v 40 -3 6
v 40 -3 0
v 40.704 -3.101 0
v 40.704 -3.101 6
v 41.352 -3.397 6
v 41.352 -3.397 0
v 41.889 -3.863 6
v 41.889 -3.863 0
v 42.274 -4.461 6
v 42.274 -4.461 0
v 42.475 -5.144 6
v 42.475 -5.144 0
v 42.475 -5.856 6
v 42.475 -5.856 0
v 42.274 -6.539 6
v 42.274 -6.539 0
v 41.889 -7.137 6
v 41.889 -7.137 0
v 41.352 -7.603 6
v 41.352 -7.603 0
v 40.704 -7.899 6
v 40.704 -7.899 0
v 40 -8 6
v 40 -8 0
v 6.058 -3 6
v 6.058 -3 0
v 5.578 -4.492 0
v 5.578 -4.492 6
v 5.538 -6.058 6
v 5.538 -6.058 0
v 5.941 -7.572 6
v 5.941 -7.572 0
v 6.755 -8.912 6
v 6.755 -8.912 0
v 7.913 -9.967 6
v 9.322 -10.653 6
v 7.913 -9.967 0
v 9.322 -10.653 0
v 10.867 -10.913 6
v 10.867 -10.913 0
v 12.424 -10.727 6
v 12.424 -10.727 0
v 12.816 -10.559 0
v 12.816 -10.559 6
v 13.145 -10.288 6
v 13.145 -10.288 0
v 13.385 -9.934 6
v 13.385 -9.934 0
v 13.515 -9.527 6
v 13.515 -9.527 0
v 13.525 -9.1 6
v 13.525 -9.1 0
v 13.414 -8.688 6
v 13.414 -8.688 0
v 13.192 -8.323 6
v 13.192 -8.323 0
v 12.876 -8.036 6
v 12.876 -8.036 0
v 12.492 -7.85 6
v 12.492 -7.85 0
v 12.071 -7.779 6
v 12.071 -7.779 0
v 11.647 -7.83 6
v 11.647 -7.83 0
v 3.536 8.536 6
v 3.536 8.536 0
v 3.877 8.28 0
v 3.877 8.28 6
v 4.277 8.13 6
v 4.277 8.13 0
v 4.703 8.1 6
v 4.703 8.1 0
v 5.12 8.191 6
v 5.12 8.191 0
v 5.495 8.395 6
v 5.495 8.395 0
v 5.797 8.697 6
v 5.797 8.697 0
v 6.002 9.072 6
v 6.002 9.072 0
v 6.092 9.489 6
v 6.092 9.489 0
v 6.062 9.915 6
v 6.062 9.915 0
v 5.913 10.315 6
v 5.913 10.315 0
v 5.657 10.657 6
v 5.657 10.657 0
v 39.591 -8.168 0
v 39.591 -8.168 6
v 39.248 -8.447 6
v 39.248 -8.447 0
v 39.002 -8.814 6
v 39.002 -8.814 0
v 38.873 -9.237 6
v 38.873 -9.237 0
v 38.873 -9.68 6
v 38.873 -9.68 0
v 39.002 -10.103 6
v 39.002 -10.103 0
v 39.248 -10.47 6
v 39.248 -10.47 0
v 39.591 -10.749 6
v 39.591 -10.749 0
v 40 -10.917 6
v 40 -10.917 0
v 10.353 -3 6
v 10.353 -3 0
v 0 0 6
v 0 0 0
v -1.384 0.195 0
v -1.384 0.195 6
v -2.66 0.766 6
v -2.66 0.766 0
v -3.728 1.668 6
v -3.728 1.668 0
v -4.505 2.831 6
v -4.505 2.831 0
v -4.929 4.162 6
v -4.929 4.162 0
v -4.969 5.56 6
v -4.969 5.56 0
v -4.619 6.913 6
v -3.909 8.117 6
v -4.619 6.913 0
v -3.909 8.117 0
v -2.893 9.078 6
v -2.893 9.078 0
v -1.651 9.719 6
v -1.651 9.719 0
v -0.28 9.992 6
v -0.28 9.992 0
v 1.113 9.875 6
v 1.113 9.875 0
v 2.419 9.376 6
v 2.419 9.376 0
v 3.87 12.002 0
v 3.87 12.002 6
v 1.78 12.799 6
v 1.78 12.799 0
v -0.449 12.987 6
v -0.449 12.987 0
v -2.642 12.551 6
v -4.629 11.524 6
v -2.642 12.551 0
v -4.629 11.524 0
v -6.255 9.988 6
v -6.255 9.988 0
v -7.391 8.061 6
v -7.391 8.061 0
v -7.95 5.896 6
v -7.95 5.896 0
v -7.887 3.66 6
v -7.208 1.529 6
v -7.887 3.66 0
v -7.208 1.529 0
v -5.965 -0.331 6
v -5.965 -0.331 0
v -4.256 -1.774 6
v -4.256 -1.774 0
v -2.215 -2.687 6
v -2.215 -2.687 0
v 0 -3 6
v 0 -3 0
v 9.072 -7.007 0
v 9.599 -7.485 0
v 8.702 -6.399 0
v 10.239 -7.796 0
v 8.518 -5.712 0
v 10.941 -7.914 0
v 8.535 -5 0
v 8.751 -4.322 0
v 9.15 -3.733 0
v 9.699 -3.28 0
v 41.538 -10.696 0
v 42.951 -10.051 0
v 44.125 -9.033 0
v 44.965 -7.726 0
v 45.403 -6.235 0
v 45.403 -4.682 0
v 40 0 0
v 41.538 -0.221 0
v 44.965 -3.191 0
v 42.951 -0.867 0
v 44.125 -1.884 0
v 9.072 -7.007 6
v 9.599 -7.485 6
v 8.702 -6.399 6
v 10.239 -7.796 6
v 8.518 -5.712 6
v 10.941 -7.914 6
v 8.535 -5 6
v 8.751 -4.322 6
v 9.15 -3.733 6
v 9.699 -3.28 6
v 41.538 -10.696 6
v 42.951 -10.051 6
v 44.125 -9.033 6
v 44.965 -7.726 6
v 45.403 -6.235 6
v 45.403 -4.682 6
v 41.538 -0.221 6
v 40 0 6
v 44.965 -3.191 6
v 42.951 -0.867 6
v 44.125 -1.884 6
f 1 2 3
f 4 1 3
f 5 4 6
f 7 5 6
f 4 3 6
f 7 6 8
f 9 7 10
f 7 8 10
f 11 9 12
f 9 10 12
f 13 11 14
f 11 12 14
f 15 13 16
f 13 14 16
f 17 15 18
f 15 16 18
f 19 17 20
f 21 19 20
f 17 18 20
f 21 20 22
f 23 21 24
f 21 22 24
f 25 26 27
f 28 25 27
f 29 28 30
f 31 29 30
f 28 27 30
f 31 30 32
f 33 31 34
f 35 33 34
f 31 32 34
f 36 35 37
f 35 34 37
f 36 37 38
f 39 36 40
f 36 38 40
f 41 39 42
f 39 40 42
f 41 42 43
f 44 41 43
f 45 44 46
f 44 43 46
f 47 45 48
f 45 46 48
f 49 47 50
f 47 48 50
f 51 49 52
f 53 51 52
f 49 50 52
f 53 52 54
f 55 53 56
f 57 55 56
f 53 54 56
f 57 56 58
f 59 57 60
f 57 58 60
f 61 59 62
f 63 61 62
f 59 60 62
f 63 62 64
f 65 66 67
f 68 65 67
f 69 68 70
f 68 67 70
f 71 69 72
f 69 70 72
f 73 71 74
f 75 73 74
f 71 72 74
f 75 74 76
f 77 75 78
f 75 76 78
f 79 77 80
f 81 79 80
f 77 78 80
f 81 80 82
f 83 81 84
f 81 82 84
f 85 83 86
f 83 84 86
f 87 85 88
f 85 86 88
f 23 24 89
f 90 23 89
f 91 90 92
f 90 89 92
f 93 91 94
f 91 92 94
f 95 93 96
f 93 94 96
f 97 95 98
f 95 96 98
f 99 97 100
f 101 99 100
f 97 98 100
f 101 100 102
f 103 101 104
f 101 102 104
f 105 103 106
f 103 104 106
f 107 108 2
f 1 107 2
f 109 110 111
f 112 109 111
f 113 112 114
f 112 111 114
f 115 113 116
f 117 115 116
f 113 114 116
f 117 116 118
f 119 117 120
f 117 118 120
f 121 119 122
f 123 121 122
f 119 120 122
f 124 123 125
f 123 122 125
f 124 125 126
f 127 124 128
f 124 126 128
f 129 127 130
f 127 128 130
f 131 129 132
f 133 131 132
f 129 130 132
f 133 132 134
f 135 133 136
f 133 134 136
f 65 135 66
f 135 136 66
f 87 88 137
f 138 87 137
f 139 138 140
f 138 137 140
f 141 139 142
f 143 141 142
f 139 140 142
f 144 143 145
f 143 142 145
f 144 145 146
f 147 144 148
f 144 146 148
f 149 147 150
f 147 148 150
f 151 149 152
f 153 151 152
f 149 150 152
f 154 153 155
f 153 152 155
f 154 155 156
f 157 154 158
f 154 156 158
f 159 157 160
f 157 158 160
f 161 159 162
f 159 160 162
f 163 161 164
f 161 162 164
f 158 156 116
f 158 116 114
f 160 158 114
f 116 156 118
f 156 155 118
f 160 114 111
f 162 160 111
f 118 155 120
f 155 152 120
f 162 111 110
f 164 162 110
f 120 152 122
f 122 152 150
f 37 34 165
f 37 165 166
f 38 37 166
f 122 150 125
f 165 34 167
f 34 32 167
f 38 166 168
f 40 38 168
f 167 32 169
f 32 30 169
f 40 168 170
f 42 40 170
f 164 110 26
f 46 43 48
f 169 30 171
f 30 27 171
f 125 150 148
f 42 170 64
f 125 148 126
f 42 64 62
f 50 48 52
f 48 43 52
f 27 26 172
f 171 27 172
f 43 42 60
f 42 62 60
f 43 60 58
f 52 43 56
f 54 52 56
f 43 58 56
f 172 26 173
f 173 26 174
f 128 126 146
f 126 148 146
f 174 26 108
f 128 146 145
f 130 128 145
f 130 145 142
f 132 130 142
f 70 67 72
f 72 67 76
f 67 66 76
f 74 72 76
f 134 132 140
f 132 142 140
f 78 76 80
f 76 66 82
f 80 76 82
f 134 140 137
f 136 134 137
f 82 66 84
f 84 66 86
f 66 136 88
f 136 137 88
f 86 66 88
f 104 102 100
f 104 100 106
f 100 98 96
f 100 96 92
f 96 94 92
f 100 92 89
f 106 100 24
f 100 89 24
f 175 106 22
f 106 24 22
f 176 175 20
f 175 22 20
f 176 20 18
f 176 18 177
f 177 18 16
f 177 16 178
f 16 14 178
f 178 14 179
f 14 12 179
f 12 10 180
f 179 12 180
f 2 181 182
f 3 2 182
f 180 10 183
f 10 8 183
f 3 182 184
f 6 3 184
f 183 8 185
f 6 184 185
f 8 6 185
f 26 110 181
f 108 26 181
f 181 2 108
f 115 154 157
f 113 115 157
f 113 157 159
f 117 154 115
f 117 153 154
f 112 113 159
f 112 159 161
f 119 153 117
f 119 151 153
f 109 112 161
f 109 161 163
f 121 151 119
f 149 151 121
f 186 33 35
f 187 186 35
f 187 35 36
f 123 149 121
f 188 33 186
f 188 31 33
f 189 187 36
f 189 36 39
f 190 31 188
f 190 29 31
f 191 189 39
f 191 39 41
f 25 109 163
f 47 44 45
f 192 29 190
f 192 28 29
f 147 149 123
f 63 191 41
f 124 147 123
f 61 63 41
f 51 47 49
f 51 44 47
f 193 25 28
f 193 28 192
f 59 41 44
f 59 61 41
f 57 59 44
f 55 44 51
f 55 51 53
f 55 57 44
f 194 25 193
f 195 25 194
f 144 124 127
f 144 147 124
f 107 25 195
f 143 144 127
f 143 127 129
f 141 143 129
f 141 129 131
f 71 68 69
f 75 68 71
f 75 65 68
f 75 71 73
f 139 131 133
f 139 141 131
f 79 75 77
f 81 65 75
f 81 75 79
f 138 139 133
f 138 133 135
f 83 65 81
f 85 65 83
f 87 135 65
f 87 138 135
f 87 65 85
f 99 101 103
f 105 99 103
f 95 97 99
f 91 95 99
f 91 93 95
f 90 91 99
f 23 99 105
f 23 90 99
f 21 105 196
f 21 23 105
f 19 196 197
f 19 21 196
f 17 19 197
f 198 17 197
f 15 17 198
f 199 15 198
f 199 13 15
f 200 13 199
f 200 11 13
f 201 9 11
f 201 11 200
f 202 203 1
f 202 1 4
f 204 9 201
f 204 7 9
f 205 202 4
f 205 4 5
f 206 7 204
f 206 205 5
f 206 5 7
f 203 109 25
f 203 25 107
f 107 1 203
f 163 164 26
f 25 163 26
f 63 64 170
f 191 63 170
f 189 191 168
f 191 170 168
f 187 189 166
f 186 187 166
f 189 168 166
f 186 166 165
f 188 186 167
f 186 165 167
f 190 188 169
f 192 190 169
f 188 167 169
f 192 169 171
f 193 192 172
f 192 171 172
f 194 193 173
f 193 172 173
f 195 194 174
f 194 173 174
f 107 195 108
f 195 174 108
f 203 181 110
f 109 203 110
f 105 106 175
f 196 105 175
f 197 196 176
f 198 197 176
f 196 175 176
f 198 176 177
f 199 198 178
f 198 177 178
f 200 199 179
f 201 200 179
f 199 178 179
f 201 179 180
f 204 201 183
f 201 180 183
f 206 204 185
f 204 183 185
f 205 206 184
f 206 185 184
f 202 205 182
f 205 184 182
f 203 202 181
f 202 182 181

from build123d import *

# Parameters (mm, degrees)
F1_DEPTH = 6


with BuildPart() as f1:
    # F0 (on Top) → F1 (new body)
    with BuildSketch(Plane.XY):
        with BuildLine():
            ThreePointArc((40, -10.917138), (45.458569, -5.458569), (40, 0))
            Line((40, 0), (10.035747, 0))
            ThreePointArc((10.035747, 0), (7.687968, -1.023864), (6.058475, -3))
            Line((6.058475, -3), (10.352952, -3))
            Line((10.352952, -3), (40, -3))
            ThreePointArc((40, -3), (42.5, -5.5), (40, -8))
            ThreePointArc((40, -8), (38.85671, -9.458569), (40, -10.917138))
        make_face()
        with BuildLine():
            ThreePointArc((6.058475, -3), (7.687968, -1.023864), (10.035747, 0))
            Line((10.035747, 0), (0, 0))
            ThreePointArc((0, 0), (-4.619398, 6.913417), (3.535534, 8.535534))
            ThreePointArc((3.535534, 8.535534), (5.656854, 8.535534), (5.656854, 10.656854))
            ThreePointArc((5.656854, 10.656854), (-7.391036, 8.061467), (0, -3))
            Line((0, -3), (6.058475, -3))
        make_face()
        with BuildLine():
            Line((10.352952, -3), (6.058475, -3))
            ThreePointArc((6.058475, -3), (6.75473, -8.911625), (12.423505, -10.727407))
            ThreePointArc((12.423505, -10.727407), (13.484165, -8.890289), (11.647048, -7.829629))
            ThreePointArc((11.647048, -7.829629), (8.585185, -6.061862), (10.352952, -3))
        make_face()
    extrude(amount=F1_DEPTH)


solid = f1.part
